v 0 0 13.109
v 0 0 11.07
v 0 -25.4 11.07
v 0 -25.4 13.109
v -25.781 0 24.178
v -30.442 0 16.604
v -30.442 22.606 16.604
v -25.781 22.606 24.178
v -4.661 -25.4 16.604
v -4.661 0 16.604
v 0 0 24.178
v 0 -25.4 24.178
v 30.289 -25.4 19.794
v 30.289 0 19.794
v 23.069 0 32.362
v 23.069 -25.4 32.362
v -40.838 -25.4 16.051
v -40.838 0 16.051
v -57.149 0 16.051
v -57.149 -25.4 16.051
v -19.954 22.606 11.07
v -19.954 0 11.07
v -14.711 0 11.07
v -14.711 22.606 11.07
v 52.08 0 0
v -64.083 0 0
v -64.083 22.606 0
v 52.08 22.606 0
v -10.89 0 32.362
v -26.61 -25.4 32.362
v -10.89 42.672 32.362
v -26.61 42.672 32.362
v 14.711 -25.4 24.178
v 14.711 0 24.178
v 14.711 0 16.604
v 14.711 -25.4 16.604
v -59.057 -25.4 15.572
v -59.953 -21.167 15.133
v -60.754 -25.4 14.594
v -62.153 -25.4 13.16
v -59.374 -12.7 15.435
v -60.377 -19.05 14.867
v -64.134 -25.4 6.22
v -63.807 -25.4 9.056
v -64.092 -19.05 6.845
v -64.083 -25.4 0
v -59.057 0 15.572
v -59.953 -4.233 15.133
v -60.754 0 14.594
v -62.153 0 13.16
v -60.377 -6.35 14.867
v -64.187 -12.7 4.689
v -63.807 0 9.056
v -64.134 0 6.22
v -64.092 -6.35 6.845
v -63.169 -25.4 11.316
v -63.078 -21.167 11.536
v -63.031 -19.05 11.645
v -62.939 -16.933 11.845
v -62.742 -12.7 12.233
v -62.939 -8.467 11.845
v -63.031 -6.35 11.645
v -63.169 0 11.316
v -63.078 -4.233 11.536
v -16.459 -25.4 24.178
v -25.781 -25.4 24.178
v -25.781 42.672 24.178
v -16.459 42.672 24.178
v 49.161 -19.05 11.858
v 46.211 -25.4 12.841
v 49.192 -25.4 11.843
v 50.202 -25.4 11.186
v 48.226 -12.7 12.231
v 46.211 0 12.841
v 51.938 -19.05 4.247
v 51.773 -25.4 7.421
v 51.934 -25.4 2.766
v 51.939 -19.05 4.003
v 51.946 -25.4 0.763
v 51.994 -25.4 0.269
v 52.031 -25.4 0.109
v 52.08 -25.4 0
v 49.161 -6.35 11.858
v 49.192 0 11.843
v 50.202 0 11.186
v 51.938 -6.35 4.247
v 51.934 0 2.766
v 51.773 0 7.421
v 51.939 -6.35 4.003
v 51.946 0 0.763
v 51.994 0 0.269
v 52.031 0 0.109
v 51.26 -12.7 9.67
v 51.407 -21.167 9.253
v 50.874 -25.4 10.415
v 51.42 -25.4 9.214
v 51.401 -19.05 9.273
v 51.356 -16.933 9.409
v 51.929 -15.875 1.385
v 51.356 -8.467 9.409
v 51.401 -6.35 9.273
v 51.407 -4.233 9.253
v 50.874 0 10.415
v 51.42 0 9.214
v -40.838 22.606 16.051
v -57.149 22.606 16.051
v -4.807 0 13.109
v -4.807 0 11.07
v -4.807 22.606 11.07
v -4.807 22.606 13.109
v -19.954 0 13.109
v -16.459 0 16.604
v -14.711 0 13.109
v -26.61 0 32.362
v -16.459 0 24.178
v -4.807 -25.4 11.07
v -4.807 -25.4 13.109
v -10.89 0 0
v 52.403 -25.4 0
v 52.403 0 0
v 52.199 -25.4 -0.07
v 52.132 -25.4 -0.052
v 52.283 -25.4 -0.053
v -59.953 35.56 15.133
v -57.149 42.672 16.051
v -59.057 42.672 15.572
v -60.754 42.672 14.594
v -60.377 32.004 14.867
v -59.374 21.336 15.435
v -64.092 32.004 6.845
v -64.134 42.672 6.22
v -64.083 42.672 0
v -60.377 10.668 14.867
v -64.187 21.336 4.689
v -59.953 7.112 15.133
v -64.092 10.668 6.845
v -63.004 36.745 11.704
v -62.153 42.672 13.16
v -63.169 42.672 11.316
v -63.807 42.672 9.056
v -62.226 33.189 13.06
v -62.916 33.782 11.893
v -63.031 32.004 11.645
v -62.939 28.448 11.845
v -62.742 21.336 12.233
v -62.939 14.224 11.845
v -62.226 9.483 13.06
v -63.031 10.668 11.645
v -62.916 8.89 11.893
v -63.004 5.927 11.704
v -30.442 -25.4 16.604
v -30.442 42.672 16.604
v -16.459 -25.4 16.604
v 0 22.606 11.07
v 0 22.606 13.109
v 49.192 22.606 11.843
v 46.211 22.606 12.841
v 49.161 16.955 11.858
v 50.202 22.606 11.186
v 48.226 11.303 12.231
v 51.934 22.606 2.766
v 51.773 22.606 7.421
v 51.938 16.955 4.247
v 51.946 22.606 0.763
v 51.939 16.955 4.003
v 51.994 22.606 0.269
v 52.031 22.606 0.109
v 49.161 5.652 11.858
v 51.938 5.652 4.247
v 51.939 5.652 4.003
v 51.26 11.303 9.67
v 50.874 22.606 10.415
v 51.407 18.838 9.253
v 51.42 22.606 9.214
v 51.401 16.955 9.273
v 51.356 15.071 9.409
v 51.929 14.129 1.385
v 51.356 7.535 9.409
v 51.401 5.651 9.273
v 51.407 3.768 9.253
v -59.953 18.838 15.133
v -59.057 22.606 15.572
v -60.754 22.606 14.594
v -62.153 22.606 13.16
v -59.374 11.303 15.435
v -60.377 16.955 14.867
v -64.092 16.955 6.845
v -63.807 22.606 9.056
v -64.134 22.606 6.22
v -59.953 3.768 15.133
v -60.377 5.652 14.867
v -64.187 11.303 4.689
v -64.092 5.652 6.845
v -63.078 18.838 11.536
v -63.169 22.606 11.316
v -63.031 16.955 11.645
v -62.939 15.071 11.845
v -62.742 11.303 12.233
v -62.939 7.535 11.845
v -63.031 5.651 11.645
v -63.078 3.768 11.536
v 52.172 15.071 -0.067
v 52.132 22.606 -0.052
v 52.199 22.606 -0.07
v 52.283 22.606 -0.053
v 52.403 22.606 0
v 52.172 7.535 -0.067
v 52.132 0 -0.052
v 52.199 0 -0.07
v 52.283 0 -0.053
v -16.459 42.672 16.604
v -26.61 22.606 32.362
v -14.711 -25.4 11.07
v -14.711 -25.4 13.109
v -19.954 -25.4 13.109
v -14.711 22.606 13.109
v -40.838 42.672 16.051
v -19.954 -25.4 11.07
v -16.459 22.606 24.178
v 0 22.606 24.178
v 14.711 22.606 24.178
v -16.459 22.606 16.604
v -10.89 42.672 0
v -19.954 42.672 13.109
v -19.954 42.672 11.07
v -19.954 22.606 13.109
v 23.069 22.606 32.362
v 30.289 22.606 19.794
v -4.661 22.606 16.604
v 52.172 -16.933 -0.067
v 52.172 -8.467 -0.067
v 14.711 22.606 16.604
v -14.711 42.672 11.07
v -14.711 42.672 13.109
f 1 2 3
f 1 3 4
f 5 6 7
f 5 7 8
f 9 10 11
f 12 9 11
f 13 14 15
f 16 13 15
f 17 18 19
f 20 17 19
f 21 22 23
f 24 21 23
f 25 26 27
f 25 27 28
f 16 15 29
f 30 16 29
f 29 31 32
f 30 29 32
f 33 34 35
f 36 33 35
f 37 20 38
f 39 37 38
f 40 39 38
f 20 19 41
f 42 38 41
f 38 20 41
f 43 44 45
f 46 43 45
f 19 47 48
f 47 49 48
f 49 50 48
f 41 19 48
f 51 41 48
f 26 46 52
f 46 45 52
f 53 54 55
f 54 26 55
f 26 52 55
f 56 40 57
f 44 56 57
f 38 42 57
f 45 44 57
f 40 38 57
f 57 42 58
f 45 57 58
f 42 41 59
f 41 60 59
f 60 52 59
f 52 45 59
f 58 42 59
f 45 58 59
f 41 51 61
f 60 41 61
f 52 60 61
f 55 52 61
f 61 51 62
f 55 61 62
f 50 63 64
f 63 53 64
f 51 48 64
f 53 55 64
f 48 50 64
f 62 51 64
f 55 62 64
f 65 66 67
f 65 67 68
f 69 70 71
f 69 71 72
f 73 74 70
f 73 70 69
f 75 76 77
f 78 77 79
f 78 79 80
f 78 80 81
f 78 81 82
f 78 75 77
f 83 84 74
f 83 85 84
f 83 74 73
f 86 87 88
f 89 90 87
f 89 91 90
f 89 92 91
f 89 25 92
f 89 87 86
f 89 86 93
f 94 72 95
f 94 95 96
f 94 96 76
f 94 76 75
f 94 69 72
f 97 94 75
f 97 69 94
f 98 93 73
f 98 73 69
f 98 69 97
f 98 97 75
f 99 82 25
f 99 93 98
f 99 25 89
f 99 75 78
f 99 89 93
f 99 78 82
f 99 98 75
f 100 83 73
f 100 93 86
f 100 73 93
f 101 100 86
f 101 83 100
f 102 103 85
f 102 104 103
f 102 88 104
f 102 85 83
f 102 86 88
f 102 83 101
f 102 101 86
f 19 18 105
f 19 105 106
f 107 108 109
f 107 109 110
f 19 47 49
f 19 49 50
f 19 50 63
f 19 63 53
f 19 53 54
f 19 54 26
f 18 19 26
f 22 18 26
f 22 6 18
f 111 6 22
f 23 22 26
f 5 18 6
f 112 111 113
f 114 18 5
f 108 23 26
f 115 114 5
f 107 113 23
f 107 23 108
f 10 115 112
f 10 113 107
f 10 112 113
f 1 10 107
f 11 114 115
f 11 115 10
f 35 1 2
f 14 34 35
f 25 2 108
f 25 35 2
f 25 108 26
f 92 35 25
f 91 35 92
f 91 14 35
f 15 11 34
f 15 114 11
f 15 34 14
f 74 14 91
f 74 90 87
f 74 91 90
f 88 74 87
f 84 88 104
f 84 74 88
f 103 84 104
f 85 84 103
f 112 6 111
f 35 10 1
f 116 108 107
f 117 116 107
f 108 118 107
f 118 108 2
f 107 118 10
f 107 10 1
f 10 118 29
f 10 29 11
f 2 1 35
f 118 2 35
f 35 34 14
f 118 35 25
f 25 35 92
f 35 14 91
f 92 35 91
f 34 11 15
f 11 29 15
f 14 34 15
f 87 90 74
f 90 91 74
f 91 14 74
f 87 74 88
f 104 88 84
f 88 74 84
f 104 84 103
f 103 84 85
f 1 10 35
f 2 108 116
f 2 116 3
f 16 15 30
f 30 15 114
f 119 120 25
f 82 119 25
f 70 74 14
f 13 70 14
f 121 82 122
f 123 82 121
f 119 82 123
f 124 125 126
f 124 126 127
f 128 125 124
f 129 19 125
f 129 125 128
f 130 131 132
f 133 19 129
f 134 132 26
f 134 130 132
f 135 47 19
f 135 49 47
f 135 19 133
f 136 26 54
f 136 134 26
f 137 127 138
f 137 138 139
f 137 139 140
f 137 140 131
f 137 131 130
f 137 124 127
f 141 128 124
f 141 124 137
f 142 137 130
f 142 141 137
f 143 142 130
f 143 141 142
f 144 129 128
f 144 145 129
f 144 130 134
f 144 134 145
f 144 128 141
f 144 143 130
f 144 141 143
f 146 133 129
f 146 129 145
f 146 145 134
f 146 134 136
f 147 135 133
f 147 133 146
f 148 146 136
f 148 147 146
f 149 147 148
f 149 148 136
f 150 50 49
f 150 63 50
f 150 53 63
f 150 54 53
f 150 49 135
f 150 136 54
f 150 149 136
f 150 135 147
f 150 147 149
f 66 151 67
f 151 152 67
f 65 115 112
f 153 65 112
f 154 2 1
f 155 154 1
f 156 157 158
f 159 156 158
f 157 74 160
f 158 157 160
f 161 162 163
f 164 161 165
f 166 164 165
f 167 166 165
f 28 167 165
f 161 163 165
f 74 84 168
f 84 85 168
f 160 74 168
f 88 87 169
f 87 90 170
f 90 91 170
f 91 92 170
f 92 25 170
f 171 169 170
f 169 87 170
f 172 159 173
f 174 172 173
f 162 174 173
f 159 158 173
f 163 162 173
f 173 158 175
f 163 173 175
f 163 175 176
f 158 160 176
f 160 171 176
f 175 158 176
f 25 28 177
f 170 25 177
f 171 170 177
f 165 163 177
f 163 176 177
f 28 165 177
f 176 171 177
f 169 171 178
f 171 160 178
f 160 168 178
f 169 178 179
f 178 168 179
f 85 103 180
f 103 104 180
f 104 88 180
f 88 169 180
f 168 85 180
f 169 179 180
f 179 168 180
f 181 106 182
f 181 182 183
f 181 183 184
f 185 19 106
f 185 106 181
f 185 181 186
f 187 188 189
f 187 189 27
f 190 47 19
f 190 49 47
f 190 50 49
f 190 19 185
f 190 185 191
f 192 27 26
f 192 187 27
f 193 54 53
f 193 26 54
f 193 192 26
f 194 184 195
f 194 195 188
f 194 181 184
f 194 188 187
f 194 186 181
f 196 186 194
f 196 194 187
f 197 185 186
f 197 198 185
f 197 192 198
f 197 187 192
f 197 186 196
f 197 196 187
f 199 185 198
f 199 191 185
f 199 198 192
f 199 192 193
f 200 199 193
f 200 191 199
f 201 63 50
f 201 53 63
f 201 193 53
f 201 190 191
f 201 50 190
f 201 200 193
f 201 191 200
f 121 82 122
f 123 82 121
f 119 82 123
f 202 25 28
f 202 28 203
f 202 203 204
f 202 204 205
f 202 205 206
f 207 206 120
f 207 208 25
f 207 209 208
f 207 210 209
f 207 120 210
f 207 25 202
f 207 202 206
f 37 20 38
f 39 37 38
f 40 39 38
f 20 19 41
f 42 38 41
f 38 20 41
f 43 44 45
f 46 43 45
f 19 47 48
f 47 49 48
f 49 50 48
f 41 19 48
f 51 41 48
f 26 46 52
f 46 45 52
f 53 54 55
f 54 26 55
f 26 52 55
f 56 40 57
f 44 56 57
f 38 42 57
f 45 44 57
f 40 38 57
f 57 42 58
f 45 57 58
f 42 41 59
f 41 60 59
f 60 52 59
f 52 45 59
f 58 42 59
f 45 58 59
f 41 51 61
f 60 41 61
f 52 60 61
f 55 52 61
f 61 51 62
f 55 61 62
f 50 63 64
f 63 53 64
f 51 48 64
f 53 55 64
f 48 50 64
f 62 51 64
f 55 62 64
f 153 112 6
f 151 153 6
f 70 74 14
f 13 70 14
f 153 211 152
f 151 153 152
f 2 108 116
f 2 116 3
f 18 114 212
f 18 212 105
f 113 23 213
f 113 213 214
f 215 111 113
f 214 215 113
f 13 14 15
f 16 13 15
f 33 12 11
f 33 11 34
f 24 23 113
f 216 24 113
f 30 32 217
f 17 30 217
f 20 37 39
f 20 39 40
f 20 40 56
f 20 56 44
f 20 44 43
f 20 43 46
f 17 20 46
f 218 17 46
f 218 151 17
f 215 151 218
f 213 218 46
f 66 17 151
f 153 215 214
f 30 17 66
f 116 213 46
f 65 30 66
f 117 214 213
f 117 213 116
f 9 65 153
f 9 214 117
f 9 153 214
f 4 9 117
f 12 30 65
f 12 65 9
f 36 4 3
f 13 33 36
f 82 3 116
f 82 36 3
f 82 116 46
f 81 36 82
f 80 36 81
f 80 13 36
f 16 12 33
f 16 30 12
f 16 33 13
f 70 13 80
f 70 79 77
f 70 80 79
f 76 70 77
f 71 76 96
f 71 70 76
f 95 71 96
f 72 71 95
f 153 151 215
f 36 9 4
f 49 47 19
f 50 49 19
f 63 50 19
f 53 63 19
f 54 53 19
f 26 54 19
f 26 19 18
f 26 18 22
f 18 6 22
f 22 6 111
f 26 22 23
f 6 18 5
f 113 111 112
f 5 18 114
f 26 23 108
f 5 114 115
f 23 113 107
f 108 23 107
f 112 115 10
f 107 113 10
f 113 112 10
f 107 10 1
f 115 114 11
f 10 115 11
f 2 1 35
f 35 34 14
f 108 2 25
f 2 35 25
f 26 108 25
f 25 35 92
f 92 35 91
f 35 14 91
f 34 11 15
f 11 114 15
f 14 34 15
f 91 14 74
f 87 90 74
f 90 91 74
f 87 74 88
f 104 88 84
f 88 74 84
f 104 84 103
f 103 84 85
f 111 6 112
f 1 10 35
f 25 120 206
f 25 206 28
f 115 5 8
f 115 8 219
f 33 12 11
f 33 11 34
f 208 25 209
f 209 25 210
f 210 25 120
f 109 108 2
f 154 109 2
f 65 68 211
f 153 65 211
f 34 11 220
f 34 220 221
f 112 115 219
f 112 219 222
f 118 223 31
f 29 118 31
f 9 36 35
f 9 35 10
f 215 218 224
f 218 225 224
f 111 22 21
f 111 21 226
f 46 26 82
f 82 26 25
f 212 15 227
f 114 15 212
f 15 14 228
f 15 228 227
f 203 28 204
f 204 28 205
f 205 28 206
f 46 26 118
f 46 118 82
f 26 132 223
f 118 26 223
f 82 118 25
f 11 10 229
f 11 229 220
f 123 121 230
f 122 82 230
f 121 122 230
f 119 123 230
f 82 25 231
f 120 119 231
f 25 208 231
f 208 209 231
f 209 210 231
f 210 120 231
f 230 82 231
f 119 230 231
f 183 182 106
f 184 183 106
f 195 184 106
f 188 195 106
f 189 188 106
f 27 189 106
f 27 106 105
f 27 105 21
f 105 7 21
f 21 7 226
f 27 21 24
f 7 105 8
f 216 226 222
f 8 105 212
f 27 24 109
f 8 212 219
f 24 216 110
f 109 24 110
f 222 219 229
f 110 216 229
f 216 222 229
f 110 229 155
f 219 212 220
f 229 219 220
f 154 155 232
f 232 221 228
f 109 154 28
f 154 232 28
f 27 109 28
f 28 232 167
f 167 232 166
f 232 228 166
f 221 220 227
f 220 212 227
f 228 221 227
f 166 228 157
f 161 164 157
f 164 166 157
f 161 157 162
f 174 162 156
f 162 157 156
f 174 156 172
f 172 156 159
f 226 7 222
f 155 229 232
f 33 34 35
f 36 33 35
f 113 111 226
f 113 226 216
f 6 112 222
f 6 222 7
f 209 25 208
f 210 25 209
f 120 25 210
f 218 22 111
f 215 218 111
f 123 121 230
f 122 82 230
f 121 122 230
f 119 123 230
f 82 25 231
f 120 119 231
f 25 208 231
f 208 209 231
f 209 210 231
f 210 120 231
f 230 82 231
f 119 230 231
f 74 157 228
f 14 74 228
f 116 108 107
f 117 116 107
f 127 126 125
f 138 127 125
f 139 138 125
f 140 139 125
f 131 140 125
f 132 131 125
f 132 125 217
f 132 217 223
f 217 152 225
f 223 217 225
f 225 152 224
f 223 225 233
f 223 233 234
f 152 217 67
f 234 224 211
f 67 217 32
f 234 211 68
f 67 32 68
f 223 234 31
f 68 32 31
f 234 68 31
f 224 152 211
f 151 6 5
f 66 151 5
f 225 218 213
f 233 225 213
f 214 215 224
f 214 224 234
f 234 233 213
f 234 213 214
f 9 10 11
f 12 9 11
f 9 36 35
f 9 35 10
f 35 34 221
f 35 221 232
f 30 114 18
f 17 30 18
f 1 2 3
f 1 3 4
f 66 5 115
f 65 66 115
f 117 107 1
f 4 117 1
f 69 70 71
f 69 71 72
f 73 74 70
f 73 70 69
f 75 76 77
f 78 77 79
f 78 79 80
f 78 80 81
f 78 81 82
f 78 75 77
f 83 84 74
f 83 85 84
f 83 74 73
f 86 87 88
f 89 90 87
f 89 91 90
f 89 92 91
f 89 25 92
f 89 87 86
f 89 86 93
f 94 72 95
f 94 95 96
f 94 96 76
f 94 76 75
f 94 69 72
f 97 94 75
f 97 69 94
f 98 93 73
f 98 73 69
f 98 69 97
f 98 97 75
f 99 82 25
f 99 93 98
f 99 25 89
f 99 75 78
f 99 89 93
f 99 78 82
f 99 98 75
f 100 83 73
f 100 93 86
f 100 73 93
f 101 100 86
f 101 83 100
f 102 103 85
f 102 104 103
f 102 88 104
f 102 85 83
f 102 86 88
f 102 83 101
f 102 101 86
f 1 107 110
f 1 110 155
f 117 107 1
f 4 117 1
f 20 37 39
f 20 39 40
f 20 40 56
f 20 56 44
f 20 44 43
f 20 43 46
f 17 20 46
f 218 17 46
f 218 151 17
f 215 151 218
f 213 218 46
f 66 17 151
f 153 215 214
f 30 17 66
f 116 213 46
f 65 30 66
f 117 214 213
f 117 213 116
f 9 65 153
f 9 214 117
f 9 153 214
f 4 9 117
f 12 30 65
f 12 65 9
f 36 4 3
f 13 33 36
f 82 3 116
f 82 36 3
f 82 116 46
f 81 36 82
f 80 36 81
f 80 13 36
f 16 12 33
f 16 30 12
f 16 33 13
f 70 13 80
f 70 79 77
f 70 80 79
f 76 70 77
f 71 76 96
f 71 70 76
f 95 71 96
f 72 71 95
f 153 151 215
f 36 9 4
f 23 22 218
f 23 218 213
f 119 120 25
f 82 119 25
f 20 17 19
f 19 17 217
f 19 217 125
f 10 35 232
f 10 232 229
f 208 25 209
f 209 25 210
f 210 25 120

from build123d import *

# Parameters (mm, degrees)
F0_W     = 5.2435156212
F0_H     = 2.0391447165
F1_DEPTH = 42.672
F2_DEPTH = 25.4
F0_W_2   = 4.8065559119
F3_DEPTH = 25.4
F4_DEPTH = 22.606


with BuildPart() as f1:
    # F0 (on Front) → F1 (new body)
    with BuildSketch(Plane.XZ):
        with BuildLine():
            Line((-40.8382713795, 16.0505380481), (-57.1493841708, 16.0505380481))
            add(Edge.make_bspline(
                [(-57.1493841708, 16.0505380481), (-59.4823244884, 15.7999000631), (-64.3613269577, 12.5534159504), (-64.3011848306, 4.8867385699), (-64.0834696427, 0)],
                knots=[0, 0, 0, 0, 0.425876757, 1, 1, 1, 1], degree=3))
            Line((-64.0834696427, 0), (-46.5223775801, 0))
            Line((-46.5223775801, 0), (-40.8382713795, 0))
            Line((-40.8382713795, 0), (-28.3736717173, 0))
            Line((-28.3736717173, 0), (-10.8899986371, 0))
            Line((-10.8899986371, 0), (-10.8899986371, 32.3616489768))
            Line((-10.8899986371, 32.3616489768), (-26.6098044863, 32.3616489768))
            Line((-26.6098044863, 32.3616489768), (-40.8382713795, 16.0505380481))
        make_face()
        with Locations((-17.3327269753, 12.0892126892)):
            Rectangle(F0_W, F0_H, mode=Mode.SUBTRACT)
        Polygon((-30.4415124678, 16.6044600514), (-25.7806094957, 24.1784253785), (-16.4588071117, 24.1784253785), (-16.4588071117, 16.6044600514), align=None, mode=Mode.SUBTRACT)
    extrude(amount=-F1_DEPTH)



with BuildPart() as f2:
    # F0 (on Front) → F2 (new body)
    with BuildSketch(Plane.XZ):
        with BuildLine():
            Line((52.4034920648, 0), (52.079555398, 0))
            add(Edge.make_bspline(
                [(52.079555398, 0), (52.1599144336, -0.1209623113), (52.2809419908, -0.0594935416), (52.4034920648, 0)],
                knots=[0.907092084, 0.907092084, 0.907092084, 0.907092084, 1, 1, 1, 1], degree=3))
        make_face()
    extrude(amount=F2_DEPTH)


with BuildPart() as f1_1:
    add(f1.part)

    add(f2.part)  # F2#2 merges F2
    # F0 (on Front) → F2, piece 2 (join)
    with BuildSketch(Plane.XZ):
        with BuildLine():
            Line((-40.8382713795, 16.0505380481), (-57.1493841708, 16.0505380481))
            add(Edge.make_bspline(
                [(-57.1493841708, 16.0505380481), (-59.4823244884, 15.7999000631), (-64.3613269577, 12.5534159504), (-64.3011848306, 4.8867385699), (-64.0834696427, 0)],
                knots=[0, 0, 0, 0, 0.425876757, 1, 1, 1, 1], degree=3))
            Line((-64.0834696427, 0), (-46.5223775801, 0))
            Line((-46.5223775801, 0), (-40.8382713795, 0))
            Line((-40.8382713795, 0), (-28.3736717173, 0))
            Line((-28.3736717173, 0), (-10.8899986371, 0))
            Line((-10.8899986371, 0), (-10.8899986371, 32.3616489768))
            Line((-10.8899986371, 32.3616489768), (-26.6098044863, 32.3616489768))
            Line((-26.6098044863, 32.3616489768), (-40.8382713795, 16.0505380481))
        make_face()
        with Locations((-17.3327269753, 12.0892126892)):
            Rectangle(F0_W, F0_H, mode=Mode.SUBTRACT)
        Polygon((-30.4415124678, 16.6044600514), (-25.7806094957, 24.1784253785), (-16.4588071117, 24.1784253785), (-16.4588071117, 16.6044600514), align=None, mode=Mode.SUBTRACT)
        with BuildLine():
            Line((23.0692047626, 32.3616489768), (-10.8899986371, 32.3616489768))
            Line((-10.8899986371, 32.3616489768), (-10.8899986371, 0))
            Line((-10.8899986371, 0), (0, 0))
            Line((0, 0), (31.5807702102, 0))
            Line((31.5807702102, 0), (52.079555398, 0))
            add(Edge.make_bspline(
                [(46.2113042618, 12.8407497437), (48.2538589952, 12.1899452229), (53.0283884486, 11.5917736788), (51.6397257395, 0.6620638447), (52.079555398, 0)],
                knots=[0, 0, 0, 0, 0.3985785526, 0.907092084, 0.907092084, 0.907092084, 0.907092084], degree=3))
            Line((46.2113042618, 12.8407497437), (30.2888769656, 19.7940729558))
            Line((30.2888769656, 19.7940729558), (23.0692047626, 32.3616489768))
        make_face()
        with Locations((-2.4032779559, 12.0892126892)):
            Rectangle(F0_W_2, F0_H, mode=Mode.SUBTRACT)
        Polygon((0, 24.1784253785), (14.7109700548, 24.1784253785), (14.7109700548, 16.6044600514), (-4.6609029722, 16.6044600514), align=None, mode=Mode.SUBTRACT)
    extrude(amount=F2_DEPTH)


with BuildPart() as f3:
    # F0 (on Front) → F3 (new body)
    with BuildSketch(Plane.XZ):
        with BuildLine():
            Line((52.4034920648, 0), (52.079555398, 0))
            add(Edge.make_bspline(
                [(52.079555398, 0), (52.1599144336, -0.1209623113), (52.2809419908, -0.0594935416), (52.4034920648, 0)],
                knots=[0.907092084, 0.907092084, 0.907092084, 0.907092084, 1, 1, 1, 1], degree=3))
        make_face()
    extrude(amount=F3_DEPTH)


with BuildPart() as f3b:
    # F0 (on Front) → F3, piece 2 (new body)
    with BuildSketch(Plane.XZ):
        with BuildLine():
            Line((-40.8382713795, 16.0505380481), (-57.1493841708, 16.0505380481))
            add(Edge.make_bspline(
                [(-57.1493841708, 16.0505380481), (-59.4823244884, 15.7999000631), (-64.3613269577, 12.5534159504), (-64.3011848306, 4.8867385699), (-64.0834696427, 0)],
                knots=[0, 0, 0, 0, 0.425876757, 1, 1, 1, 1], degree=3))
            Line((-64.0834696427, 0), (-46.5223775801, 0))
            Line((-46.5223775801, 0), (-40.8382713795, 0))
            Line((-40.8382713795, 0), (-28.3736717173, 0))
            Line((-28.3736717173, 0), (-10.8899986371, 0))
            Line((-10.8899986371, 0), (-10.8899986371, 32.3616489768))
            Line((-10.8899986371, 32.3616489768), (-26.6098044863, 32.3616489768))
            Line((-26.6098044863, 32.3616489768), (-40.8382713795, 16.0505380481))
        make_face()
        with Locations((-17.3327269753, 12.0892126892)):
            Rectangle(F0_W, F0_H, mode=Mode.SUBTRACT)
        Polygon((-30.4415124678, 16.6044600514), (-25.7806094957, 24.1784253785), (-16.4588071117, 24.1784253785), (-16.4588071117, 16.6044600514), align=None, mode=Mode.SUBTRACT)
        with BuildLine():
            Line((23.0692047626, 32.3616489768), (-10.8899986371, 32.3616489768))
            Line((-10.8899986371, 32.3616489768), (-10.8899986371, 0))
            Line((-10.8899986371, 0), (0, 0))
            Line((0, 0), (31.5807702102, 0))
            Line((31.5807702102, 0), (52.079555398, 0))
            add(Edge.make_bspline(
                [(46.2113042618, 12.8407497437), (48.2538589952, 12.1899452229), (53.0283884486, 11.5917736788), (51.6397257395, 0.6620638447), (52.079555398, 0)],
                knots=[0, 0, 0, 0, 0.3985785526, 0.907092084, 0.907092084, 0.907092084, 0.907092084], degree=3))
            Line((46.2113042618, 12.8407497437), (30.2888769656, 19.7940729558))
            Line((30.2888769656, 19.7940729558), (23.0692047626, 32.3616489768))
        make_face()
        with Locations((-2.4032779559, 12.0892126892)):
            Rectangle(F0_W_2, F0_H, mode=Mode.SUBTRACT)
        Polygon((0, 24.1784253785), (14.7109700548, 24.1784253785), (14.7109700548, 16.6044600514), (-4.6609029722, 16.6044600514), align=None, mode=Mode.SUBTRACT)
    extrude(amount=F3_DEPTH)


with BuildPart() as f4:
    # F0 (on Front) → F4 (new body)
    with BuildSketch(Plane.XZ):
        with BuildLine():
            Line((52.4034920648, 0), (52.079555398, 0))
            add(Edge.make_bspline(
                [(52.079555398, 0), (52.1599144336, -0.1209623113), (52.2809419908, -0.0594935416), (52.4034920648, 0)],
                knots=[0.907092084, 0.907092084, 0.907092084, 0.907092084, 1, 1, 1, 1], degree=3))
        make_face()
    extrude(amount=-F4_DEPTH)


with BuildPart() as f4b:
    # F0 (on Front) → F4, piece 2 (new body)
    with BuildSketch(Plane.XZ):
        with BuildLine():
            Line((-40.8382713795, 16.0505380481), (-57.1493841708, 16.0505380481))
            add(Edge.make_bspline(
                [(-57.1493841708, 16.0505380481), (-59.4823244884, 15.7999000631), (-64.3613269577, 12.5534159504), (-64.3011848306, 4.8867385699), (-64.0834696427, 0)],
                knots=[0, 0, 0, 0, 0.425876757, 1, 1, 1, 1], degree=3))
            Line((-64.0834696427, 0), (-46.5223775801, 0))
            Line((-46.5223775801, 0), (-40.8382713795, 0))
            Line((-40.8382713795, 0), (-28.3736717173, 0))
            Line((-28.3736717173, 0), (-10.8899986371, 0))
            Line((-10.8899986371, 0), (-10.8899986371, 32.3616489768))
            Line((-10.8899986371, 32.3616489768), (-26.6098044863, 32.3616489768))
            Line((-26.6098044863, 32.3616489768), (-40.8382713795, 16.0505380481))
        make_face()
        with Locations((-17.3327269753, 12.0892126892)):
            Rectangle(F0_W, F0_H, mode=Mode.SUBTRACT)
        Polygon((-30.4415124678, 16.6044600514), (-25.7806094957, 24.1784253785), (-16.4588071117, 24.1784253785), (-16.4588071117, 16.6044600514), align=None, mode=Mode.SUBTRACT)
        with BuildLine():
            Line((23.0692047626, 32.3616489768), (-10.8899986371, 32.3616489768))
            Line((-10.8899986371, 32.3616489768), (-10.8899986371, 0))
            Line((-10.8899986371, 0), (0, 0))
            Line((0, 0), (31.5807702102, 0))
            Line((31.5807702102, 0), (52.079555398, 0))
            add(Edge.make_bspline(
                [(46.2113042618, 12.8407497437), (48.2538589952, 12.1899452229), (53.0283884486, 11.5917736788), (51.6397257395, 0.6620638447), (52.079555398, 0)],
                knots=[0, 0, 0, 0, 0.3985785526, 0.907092084, 0.907092084, 0.907092084, 0.907092084], degree=3))
            Line((46.2113042618, 12.8407497437), (30.2888769656, 19.7940729558))
            Line((30.2888769656, 19.7940729558), (23.0692047626, 32.3616489768))
        make_face()
        with Locations((-2.4032779559, 12.0892126892)):
            Rectangle(F0_W_2, F0_H, mode=Mode.SUBTRACT)
        Polygon((0, 24.1784253785), (14.7109700548, 24.1784253785), (14.7109700548, 16.6044600514), (-4.6609029722, 16.6044600514), align=None, mode=Mode.SUBTRACT)
    extrude(amount=-F4_DEPTH)


solid = Compound([f1_1.part, f3.part, f3b.part, f4.part, f4b.part])
